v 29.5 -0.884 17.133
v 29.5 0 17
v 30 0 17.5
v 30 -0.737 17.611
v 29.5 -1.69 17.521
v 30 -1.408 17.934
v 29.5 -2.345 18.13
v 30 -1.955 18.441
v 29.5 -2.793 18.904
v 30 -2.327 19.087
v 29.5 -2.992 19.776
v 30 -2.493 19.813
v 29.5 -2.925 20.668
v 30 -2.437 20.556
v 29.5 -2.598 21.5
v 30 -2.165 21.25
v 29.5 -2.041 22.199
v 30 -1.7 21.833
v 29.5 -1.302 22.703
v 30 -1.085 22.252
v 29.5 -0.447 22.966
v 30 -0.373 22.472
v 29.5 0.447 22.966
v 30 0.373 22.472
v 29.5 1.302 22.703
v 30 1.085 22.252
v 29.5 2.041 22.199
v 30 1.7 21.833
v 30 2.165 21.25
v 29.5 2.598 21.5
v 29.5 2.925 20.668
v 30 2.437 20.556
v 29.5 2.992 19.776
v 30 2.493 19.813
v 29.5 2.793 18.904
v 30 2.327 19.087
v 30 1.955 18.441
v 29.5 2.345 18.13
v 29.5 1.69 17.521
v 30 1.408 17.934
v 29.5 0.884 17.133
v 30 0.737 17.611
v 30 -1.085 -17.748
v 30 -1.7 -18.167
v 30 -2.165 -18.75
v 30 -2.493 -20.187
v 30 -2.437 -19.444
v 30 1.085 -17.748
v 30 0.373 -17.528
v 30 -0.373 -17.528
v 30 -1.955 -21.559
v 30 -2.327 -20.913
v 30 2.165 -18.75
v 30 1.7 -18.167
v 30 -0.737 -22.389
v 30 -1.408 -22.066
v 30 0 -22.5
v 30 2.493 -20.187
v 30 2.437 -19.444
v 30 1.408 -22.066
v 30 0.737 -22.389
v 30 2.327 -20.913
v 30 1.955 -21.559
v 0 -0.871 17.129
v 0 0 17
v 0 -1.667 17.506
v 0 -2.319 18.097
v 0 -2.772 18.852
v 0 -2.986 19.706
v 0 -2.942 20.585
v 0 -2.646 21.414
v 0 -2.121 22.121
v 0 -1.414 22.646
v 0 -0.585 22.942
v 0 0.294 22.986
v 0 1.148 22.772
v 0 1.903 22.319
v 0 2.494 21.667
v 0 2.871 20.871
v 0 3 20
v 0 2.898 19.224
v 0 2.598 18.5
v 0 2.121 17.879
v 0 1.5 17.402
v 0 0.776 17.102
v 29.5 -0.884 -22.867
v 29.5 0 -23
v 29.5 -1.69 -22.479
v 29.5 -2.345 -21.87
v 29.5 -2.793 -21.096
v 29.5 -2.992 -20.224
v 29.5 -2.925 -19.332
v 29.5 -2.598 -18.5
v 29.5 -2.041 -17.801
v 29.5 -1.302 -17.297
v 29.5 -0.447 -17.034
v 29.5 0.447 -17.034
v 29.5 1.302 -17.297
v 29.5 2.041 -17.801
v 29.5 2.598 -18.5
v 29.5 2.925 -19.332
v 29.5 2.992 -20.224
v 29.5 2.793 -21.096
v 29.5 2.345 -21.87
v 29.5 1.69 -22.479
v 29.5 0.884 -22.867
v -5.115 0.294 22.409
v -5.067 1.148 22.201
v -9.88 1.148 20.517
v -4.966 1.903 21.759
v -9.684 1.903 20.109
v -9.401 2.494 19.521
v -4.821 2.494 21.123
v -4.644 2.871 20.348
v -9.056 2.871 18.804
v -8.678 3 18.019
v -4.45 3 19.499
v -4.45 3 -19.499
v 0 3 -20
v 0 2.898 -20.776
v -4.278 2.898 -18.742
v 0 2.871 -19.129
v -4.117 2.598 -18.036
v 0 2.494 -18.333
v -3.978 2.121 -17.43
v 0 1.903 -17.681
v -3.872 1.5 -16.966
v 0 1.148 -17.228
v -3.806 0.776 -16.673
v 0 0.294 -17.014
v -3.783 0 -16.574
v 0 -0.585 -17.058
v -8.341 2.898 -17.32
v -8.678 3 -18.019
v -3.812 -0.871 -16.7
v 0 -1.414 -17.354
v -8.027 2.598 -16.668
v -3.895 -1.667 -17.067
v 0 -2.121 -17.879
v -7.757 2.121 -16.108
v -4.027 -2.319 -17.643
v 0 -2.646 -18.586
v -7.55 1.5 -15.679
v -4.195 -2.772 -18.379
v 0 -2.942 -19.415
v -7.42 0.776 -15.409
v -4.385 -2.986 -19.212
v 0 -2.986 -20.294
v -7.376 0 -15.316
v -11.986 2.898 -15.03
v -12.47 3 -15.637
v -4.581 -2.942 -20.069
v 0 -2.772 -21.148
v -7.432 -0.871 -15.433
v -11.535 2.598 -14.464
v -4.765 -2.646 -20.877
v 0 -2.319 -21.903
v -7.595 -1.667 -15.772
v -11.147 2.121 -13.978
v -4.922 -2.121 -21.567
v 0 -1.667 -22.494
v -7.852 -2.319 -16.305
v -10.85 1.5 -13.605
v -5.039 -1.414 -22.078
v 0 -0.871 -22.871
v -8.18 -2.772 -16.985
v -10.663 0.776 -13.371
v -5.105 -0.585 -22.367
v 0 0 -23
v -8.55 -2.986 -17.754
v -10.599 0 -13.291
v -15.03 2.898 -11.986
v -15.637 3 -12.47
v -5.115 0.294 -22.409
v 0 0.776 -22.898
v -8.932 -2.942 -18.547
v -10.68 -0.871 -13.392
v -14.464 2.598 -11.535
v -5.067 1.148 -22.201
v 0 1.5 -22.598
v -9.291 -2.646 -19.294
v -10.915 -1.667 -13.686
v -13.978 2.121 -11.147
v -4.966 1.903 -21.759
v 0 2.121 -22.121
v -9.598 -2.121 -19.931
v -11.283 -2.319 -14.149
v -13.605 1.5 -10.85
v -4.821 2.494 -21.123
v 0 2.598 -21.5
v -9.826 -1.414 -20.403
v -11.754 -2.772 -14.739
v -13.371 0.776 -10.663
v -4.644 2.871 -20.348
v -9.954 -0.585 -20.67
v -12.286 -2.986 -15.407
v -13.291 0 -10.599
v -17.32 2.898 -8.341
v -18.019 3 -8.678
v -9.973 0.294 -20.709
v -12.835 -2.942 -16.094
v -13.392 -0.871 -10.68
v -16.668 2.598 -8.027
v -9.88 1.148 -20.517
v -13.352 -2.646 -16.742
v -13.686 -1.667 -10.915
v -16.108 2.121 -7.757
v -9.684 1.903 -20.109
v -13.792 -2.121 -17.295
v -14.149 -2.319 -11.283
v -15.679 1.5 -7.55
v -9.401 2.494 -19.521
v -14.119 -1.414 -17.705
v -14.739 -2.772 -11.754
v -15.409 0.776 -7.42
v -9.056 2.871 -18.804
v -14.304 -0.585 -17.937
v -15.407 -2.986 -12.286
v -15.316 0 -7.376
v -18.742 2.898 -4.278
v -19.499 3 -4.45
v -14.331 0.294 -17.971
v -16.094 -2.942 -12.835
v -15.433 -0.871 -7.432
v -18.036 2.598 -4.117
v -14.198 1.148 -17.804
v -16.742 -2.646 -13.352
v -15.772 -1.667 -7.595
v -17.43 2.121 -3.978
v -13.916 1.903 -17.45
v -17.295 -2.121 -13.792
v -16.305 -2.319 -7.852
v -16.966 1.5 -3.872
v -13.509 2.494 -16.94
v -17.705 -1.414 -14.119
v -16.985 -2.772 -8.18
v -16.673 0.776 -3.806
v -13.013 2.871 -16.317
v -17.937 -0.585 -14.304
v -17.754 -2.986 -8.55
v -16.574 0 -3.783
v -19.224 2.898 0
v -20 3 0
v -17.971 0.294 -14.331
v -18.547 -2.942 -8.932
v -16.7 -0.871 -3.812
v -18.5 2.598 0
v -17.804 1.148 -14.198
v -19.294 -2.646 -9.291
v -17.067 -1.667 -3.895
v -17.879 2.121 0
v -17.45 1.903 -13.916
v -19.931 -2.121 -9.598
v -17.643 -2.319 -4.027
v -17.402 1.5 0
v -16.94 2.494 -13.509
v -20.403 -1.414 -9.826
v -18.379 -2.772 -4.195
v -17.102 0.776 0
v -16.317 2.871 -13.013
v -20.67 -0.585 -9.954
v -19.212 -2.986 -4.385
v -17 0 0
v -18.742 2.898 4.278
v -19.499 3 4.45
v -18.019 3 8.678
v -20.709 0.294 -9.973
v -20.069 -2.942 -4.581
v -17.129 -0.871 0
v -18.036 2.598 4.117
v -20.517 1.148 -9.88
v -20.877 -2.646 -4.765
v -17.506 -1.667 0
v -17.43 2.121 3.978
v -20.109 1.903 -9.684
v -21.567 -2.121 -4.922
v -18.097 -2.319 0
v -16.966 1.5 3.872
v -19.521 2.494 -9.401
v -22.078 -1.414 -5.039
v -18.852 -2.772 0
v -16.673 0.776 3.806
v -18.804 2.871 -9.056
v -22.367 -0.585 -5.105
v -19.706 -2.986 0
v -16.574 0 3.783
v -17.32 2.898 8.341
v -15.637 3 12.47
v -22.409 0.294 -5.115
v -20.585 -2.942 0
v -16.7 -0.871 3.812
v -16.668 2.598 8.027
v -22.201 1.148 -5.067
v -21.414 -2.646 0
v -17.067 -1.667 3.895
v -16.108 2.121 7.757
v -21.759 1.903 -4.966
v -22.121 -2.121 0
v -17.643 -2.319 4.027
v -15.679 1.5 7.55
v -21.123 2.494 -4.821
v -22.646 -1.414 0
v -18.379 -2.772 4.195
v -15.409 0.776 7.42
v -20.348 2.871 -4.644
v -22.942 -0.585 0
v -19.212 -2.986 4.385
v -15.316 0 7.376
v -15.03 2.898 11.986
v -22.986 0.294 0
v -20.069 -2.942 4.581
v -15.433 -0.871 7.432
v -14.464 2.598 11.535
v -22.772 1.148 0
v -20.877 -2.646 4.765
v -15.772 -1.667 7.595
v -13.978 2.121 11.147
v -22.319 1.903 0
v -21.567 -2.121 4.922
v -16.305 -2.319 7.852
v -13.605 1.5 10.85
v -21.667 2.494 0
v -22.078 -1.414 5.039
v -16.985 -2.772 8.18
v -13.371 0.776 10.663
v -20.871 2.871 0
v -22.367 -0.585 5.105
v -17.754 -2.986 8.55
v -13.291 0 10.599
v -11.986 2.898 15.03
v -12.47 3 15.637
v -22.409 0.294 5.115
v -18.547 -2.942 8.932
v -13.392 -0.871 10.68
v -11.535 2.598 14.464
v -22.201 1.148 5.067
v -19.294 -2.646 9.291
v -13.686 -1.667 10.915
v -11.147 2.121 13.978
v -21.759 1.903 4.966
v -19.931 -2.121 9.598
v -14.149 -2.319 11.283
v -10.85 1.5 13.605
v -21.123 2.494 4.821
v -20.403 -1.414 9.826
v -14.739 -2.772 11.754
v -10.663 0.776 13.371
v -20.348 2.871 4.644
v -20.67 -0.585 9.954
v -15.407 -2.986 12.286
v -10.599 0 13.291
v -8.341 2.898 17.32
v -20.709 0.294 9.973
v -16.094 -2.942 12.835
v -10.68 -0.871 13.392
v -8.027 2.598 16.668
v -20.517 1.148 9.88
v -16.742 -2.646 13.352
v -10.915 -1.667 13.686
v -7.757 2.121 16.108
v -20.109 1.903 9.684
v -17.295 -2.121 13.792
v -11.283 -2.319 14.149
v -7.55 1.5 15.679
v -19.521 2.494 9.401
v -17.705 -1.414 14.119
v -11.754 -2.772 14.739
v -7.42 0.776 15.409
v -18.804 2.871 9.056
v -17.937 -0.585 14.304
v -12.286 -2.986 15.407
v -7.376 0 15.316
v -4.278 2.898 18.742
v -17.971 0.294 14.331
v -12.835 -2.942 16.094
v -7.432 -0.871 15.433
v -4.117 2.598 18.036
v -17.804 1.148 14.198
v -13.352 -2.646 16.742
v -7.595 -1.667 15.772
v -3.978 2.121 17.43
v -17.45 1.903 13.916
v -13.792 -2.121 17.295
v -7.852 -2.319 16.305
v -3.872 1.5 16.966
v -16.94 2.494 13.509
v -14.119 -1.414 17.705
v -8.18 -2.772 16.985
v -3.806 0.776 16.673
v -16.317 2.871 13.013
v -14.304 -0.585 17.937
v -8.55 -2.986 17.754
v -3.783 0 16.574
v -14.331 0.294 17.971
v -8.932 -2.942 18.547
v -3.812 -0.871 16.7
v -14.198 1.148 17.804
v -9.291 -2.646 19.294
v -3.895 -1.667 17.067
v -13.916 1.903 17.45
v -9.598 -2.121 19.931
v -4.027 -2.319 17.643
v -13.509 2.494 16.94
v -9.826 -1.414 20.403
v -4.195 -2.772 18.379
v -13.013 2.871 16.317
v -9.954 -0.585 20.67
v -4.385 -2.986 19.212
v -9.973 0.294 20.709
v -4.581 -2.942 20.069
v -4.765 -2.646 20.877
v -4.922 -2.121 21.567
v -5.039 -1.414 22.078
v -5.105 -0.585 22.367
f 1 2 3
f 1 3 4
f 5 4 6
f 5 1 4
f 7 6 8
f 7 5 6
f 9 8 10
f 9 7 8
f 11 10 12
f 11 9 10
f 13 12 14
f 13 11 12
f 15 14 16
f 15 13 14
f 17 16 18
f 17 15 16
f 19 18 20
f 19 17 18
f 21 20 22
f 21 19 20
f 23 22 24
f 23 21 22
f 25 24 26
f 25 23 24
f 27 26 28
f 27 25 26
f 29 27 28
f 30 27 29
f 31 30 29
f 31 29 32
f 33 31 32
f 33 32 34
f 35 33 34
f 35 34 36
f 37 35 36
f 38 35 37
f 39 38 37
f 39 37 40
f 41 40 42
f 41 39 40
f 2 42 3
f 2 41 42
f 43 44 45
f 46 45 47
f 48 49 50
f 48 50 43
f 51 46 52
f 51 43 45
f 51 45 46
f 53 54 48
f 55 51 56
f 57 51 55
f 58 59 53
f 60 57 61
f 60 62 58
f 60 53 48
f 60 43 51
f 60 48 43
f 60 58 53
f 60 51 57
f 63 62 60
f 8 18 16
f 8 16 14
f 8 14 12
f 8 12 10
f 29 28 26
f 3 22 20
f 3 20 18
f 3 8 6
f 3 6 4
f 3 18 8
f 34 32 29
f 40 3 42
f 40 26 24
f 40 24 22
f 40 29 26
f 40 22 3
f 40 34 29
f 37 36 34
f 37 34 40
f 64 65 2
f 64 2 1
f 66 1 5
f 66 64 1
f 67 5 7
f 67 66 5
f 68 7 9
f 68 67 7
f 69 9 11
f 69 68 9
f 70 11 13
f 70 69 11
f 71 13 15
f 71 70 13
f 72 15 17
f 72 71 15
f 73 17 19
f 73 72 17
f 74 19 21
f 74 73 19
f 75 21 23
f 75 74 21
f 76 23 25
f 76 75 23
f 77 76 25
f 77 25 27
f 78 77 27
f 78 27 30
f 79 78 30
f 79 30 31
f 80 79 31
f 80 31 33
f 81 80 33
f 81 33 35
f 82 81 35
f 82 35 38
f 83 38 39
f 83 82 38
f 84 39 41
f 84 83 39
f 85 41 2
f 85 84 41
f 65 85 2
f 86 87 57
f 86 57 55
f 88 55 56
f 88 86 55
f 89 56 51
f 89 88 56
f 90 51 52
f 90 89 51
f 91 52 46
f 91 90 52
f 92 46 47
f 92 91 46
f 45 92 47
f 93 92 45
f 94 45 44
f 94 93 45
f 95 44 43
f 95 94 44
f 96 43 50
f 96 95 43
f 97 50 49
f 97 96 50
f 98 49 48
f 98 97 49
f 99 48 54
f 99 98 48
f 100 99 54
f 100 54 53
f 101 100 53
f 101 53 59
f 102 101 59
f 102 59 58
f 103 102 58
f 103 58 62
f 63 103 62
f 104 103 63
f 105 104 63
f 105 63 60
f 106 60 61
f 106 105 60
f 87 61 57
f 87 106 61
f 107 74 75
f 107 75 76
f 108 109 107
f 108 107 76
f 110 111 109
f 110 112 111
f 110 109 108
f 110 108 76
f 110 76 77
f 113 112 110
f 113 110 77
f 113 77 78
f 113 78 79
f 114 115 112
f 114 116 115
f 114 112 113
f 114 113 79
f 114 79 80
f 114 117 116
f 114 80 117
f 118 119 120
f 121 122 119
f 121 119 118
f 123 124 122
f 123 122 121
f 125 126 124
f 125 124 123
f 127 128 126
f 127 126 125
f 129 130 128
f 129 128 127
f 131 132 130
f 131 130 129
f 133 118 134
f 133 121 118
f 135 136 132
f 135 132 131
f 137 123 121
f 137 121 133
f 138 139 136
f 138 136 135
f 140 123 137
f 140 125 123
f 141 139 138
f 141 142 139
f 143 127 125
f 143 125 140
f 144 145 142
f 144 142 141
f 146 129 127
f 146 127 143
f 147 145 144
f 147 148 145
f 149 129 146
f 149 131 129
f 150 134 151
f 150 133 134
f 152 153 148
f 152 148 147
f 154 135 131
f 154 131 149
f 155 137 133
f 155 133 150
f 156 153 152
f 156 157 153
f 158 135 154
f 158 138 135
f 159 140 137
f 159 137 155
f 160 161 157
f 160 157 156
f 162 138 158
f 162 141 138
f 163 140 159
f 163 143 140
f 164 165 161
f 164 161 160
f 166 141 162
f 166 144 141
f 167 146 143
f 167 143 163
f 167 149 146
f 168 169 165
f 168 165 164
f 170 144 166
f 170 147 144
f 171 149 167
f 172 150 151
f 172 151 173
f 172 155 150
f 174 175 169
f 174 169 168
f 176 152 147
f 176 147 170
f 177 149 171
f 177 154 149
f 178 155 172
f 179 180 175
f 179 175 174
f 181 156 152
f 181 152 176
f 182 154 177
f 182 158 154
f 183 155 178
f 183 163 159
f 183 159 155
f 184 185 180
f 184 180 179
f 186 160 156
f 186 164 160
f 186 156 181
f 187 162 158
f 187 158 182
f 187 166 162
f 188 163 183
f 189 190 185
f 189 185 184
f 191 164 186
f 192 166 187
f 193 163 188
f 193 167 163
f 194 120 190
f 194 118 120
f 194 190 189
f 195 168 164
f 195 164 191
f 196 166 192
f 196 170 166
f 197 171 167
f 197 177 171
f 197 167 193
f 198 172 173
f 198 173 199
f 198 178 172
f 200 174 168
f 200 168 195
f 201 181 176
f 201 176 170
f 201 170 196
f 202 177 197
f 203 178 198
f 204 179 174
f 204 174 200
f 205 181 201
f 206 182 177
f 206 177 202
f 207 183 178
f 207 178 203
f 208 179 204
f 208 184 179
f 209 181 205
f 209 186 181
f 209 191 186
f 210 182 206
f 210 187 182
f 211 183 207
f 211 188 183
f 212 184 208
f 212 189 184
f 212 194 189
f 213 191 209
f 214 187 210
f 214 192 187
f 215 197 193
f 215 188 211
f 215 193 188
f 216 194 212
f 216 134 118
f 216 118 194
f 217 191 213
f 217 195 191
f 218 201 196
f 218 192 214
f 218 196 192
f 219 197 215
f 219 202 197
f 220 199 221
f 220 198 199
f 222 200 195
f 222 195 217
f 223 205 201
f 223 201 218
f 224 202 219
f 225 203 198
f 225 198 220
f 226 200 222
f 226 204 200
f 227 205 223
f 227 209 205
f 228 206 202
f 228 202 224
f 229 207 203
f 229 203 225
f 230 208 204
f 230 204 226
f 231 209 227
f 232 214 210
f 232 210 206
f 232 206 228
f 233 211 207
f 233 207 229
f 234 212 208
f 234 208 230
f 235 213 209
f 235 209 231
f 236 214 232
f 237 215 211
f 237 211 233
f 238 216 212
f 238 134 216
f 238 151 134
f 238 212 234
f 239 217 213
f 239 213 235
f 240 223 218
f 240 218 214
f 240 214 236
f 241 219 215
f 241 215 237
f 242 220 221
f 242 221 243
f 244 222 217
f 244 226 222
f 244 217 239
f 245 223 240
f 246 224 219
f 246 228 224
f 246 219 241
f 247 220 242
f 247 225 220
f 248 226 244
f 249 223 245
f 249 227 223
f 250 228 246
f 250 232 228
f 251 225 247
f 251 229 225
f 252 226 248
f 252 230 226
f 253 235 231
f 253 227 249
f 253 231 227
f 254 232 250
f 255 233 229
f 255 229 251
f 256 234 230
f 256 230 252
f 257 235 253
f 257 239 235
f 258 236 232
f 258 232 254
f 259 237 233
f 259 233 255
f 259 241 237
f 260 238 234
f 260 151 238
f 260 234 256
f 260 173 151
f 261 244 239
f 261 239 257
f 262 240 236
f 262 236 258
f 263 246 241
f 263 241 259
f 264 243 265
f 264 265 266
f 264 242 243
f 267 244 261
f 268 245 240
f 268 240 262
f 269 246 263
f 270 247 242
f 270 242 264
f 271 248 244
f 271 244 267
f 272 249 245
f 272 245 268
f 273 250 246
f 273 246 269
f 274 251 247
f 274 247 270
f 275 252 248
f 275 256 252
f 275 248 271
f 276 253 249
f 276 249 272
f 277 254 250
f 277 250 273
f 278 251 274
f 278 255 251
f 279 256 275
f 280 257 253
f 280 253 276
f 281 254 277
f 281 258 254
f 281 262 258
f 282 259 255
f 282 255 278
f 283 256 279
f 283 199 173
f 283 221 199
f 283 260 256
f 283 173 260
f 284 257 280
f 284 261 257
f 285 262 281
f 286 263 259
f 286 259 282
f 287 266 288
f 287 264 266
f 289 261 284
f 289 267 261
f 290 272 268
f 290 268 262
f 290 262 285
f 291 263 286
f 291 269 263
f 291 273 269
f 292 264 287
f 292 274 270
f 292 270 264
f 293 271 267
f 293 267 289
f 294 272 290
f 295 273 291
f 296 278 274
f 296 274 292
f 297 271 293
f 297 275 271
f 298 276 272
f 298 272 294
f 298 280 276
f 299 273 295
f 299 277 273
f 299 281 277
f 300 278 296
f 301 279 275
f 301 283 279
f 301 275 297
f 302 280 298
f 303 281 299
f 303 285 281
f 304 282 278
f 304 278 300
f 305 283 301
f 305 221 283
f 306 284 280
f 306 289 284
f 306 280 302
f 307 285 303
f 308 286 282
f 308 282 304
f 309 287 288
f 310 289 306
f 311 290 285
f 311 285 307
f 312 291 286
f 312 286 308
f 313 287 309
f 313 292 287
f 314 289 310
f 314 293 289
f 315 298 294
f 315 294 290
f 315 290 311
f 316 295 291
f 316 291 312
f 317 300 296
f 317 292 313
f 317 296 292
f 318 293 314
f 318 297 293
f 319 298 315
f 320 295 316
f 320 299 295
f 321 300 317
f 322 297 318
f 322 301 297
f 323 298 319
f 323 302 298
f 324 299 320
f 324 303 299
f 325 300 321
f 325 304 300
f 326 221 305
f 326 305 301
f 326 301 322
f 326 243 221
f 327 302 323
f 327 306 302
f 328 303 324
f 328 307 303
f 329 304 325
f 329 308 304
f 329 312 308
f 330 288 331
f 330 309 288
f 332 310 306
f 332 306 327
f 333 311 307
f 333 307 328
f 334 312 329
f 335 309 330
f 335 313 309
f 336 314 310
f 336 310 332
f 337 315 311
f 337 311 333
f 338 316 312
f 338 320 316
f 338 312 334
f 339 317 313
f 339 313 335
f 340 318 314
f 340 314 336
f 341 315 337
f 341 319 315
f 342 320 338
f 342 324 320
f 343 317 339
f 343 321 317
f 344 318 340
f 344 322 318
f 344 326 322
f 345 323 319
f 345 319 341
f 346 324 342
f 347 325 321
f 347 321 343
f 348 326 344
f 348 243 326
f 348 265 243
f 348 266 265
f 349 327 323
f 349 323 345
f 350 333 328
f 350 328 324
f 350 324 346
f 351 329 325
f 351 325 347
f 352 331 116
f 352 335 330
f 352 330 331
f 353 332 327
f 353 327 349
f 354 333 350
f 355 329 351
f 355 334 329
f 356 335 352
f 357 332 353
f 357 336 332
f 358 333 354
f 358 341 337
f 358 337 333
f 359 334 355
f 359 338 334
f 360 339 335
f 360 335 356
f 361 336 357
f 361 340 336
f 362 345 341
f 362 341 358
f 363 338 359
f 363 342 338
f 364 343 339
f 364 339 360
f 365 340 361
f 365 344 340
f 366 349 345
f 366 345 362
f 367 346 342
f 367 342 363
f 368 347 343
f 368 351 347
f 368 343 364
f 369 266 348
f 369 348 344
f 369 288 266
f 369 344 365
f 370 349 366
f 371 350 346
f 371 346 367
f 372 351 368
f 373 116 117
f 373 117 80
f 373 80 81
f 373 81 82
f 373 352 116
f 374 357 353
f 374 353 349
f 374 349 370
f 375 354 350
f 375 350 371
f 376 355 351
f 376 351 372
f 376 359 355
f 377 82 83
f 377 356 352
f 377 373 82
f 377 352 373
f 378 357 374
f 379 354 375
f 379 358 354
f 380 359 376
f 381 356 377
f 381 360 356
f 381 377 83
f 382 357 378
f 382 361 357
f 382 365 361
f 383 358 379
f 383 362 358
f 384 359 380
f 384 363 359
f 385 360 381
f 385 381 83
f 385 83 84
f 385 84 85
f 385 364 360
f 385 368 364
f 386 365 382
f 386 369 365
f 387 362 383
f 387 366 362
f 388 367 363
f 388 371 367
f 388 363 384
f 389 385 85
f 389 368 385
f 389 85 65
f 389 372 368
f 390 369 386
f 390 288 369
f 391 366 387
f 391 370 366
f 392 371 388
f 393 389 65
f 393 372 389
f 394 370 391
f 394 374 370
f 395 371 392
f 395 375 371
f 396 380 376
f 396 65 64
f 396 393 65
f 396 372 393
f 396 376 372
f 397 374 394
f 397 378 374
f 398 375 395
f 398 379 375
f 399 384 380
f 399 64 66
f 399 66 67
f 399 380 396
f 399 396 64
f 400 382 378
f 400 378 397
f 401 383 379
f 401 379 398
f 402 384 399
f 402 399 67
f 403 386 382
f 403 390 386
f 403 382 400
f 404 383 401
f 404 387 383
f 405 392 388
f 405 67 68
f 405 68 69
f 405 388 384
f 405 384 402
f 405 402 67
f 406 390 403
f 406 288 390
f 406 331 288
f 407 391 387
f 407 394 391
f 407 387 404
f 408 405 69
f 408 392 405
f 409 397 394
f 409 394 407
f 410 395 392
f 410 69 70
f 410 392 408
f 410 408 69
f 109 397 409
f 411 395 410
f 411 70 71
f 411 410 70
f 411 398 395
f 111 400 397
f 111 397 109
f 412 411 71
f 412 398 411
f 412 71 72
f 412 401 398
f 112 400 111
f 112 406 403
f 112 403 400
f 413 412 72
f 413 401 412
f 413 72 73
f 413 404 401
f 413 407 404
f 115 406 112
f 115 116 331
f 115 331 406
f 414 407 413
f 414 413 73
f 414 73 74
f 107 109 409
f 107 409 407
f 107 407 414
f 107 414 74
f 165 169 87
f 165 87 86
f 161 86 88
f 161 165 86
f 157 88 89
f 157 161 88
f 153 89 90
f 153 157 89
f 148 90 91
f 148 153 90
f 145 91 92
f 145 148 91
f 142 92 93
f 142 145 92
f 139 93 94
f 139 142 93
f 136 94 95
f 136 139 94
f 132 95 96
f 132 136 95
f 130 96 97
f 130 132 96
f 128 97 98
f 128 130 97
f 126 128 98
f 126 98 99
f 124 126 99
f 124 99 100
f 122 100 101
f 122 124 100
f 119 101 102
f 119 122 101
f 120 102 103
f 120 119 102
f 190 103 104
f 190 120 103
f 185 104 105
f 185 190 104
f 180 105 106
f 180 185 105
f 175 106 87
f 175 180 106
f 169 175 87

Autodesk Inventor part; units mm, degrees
ref_plane "YZ Plane" through (0, 0, 0) normal (1, 0, 0) x (0, 1, 0)
ref_plane "XZ Plane" through (0, 0, 0) normal (0, 1, 0) x (-1, 0, 0)
ref_plane "XY Plane" through (0, 0, 0) normal (0, 0, 1) x (1, 0, 0)
sketch "Esboço1" plane through (0, 0, 0) normal (1, 0, 0) x (0, 1, 0)
  line L0 (0, 0) -> (15, 0)
  circle A0 centre (0, -20) radius 3
revolve "Revolução1" add sketch "Esboço1" angle 180 about axis through (0, 0, 0) along (0, 1, 0)
sketch "Esboço2" plane through (0, 0, 20) normal (1, 0, 0) x (0, 0, -1)
  circle A0 centre (0, 0) radius 3
  circle A1 centre (40, 0) radius 3
  point P0 (20, 0)
extrude "Extrusão1" add sketch "Esboço2" along normal blind 30
chamfer "Chanfro1" distance 0.5 angle 45 2 edges at (30, 0, -17) (30, 0, 23)
sketch "Esboço3" plane through (0, 0, 0) normal (0, 1, 0) x (-1, 0, 0)
  point P0 (0, 0)
thread "Rosca1" size "M6x1" class "6g" standard "ANSI Metric M Profile" length 25 offset 5
thread "Rosca2" size "M6x1" class "6g" standard "ANSI Metric M Profile" length 25
properties part number "parafuso u abraçadeira" material "Aço inoxidável"
